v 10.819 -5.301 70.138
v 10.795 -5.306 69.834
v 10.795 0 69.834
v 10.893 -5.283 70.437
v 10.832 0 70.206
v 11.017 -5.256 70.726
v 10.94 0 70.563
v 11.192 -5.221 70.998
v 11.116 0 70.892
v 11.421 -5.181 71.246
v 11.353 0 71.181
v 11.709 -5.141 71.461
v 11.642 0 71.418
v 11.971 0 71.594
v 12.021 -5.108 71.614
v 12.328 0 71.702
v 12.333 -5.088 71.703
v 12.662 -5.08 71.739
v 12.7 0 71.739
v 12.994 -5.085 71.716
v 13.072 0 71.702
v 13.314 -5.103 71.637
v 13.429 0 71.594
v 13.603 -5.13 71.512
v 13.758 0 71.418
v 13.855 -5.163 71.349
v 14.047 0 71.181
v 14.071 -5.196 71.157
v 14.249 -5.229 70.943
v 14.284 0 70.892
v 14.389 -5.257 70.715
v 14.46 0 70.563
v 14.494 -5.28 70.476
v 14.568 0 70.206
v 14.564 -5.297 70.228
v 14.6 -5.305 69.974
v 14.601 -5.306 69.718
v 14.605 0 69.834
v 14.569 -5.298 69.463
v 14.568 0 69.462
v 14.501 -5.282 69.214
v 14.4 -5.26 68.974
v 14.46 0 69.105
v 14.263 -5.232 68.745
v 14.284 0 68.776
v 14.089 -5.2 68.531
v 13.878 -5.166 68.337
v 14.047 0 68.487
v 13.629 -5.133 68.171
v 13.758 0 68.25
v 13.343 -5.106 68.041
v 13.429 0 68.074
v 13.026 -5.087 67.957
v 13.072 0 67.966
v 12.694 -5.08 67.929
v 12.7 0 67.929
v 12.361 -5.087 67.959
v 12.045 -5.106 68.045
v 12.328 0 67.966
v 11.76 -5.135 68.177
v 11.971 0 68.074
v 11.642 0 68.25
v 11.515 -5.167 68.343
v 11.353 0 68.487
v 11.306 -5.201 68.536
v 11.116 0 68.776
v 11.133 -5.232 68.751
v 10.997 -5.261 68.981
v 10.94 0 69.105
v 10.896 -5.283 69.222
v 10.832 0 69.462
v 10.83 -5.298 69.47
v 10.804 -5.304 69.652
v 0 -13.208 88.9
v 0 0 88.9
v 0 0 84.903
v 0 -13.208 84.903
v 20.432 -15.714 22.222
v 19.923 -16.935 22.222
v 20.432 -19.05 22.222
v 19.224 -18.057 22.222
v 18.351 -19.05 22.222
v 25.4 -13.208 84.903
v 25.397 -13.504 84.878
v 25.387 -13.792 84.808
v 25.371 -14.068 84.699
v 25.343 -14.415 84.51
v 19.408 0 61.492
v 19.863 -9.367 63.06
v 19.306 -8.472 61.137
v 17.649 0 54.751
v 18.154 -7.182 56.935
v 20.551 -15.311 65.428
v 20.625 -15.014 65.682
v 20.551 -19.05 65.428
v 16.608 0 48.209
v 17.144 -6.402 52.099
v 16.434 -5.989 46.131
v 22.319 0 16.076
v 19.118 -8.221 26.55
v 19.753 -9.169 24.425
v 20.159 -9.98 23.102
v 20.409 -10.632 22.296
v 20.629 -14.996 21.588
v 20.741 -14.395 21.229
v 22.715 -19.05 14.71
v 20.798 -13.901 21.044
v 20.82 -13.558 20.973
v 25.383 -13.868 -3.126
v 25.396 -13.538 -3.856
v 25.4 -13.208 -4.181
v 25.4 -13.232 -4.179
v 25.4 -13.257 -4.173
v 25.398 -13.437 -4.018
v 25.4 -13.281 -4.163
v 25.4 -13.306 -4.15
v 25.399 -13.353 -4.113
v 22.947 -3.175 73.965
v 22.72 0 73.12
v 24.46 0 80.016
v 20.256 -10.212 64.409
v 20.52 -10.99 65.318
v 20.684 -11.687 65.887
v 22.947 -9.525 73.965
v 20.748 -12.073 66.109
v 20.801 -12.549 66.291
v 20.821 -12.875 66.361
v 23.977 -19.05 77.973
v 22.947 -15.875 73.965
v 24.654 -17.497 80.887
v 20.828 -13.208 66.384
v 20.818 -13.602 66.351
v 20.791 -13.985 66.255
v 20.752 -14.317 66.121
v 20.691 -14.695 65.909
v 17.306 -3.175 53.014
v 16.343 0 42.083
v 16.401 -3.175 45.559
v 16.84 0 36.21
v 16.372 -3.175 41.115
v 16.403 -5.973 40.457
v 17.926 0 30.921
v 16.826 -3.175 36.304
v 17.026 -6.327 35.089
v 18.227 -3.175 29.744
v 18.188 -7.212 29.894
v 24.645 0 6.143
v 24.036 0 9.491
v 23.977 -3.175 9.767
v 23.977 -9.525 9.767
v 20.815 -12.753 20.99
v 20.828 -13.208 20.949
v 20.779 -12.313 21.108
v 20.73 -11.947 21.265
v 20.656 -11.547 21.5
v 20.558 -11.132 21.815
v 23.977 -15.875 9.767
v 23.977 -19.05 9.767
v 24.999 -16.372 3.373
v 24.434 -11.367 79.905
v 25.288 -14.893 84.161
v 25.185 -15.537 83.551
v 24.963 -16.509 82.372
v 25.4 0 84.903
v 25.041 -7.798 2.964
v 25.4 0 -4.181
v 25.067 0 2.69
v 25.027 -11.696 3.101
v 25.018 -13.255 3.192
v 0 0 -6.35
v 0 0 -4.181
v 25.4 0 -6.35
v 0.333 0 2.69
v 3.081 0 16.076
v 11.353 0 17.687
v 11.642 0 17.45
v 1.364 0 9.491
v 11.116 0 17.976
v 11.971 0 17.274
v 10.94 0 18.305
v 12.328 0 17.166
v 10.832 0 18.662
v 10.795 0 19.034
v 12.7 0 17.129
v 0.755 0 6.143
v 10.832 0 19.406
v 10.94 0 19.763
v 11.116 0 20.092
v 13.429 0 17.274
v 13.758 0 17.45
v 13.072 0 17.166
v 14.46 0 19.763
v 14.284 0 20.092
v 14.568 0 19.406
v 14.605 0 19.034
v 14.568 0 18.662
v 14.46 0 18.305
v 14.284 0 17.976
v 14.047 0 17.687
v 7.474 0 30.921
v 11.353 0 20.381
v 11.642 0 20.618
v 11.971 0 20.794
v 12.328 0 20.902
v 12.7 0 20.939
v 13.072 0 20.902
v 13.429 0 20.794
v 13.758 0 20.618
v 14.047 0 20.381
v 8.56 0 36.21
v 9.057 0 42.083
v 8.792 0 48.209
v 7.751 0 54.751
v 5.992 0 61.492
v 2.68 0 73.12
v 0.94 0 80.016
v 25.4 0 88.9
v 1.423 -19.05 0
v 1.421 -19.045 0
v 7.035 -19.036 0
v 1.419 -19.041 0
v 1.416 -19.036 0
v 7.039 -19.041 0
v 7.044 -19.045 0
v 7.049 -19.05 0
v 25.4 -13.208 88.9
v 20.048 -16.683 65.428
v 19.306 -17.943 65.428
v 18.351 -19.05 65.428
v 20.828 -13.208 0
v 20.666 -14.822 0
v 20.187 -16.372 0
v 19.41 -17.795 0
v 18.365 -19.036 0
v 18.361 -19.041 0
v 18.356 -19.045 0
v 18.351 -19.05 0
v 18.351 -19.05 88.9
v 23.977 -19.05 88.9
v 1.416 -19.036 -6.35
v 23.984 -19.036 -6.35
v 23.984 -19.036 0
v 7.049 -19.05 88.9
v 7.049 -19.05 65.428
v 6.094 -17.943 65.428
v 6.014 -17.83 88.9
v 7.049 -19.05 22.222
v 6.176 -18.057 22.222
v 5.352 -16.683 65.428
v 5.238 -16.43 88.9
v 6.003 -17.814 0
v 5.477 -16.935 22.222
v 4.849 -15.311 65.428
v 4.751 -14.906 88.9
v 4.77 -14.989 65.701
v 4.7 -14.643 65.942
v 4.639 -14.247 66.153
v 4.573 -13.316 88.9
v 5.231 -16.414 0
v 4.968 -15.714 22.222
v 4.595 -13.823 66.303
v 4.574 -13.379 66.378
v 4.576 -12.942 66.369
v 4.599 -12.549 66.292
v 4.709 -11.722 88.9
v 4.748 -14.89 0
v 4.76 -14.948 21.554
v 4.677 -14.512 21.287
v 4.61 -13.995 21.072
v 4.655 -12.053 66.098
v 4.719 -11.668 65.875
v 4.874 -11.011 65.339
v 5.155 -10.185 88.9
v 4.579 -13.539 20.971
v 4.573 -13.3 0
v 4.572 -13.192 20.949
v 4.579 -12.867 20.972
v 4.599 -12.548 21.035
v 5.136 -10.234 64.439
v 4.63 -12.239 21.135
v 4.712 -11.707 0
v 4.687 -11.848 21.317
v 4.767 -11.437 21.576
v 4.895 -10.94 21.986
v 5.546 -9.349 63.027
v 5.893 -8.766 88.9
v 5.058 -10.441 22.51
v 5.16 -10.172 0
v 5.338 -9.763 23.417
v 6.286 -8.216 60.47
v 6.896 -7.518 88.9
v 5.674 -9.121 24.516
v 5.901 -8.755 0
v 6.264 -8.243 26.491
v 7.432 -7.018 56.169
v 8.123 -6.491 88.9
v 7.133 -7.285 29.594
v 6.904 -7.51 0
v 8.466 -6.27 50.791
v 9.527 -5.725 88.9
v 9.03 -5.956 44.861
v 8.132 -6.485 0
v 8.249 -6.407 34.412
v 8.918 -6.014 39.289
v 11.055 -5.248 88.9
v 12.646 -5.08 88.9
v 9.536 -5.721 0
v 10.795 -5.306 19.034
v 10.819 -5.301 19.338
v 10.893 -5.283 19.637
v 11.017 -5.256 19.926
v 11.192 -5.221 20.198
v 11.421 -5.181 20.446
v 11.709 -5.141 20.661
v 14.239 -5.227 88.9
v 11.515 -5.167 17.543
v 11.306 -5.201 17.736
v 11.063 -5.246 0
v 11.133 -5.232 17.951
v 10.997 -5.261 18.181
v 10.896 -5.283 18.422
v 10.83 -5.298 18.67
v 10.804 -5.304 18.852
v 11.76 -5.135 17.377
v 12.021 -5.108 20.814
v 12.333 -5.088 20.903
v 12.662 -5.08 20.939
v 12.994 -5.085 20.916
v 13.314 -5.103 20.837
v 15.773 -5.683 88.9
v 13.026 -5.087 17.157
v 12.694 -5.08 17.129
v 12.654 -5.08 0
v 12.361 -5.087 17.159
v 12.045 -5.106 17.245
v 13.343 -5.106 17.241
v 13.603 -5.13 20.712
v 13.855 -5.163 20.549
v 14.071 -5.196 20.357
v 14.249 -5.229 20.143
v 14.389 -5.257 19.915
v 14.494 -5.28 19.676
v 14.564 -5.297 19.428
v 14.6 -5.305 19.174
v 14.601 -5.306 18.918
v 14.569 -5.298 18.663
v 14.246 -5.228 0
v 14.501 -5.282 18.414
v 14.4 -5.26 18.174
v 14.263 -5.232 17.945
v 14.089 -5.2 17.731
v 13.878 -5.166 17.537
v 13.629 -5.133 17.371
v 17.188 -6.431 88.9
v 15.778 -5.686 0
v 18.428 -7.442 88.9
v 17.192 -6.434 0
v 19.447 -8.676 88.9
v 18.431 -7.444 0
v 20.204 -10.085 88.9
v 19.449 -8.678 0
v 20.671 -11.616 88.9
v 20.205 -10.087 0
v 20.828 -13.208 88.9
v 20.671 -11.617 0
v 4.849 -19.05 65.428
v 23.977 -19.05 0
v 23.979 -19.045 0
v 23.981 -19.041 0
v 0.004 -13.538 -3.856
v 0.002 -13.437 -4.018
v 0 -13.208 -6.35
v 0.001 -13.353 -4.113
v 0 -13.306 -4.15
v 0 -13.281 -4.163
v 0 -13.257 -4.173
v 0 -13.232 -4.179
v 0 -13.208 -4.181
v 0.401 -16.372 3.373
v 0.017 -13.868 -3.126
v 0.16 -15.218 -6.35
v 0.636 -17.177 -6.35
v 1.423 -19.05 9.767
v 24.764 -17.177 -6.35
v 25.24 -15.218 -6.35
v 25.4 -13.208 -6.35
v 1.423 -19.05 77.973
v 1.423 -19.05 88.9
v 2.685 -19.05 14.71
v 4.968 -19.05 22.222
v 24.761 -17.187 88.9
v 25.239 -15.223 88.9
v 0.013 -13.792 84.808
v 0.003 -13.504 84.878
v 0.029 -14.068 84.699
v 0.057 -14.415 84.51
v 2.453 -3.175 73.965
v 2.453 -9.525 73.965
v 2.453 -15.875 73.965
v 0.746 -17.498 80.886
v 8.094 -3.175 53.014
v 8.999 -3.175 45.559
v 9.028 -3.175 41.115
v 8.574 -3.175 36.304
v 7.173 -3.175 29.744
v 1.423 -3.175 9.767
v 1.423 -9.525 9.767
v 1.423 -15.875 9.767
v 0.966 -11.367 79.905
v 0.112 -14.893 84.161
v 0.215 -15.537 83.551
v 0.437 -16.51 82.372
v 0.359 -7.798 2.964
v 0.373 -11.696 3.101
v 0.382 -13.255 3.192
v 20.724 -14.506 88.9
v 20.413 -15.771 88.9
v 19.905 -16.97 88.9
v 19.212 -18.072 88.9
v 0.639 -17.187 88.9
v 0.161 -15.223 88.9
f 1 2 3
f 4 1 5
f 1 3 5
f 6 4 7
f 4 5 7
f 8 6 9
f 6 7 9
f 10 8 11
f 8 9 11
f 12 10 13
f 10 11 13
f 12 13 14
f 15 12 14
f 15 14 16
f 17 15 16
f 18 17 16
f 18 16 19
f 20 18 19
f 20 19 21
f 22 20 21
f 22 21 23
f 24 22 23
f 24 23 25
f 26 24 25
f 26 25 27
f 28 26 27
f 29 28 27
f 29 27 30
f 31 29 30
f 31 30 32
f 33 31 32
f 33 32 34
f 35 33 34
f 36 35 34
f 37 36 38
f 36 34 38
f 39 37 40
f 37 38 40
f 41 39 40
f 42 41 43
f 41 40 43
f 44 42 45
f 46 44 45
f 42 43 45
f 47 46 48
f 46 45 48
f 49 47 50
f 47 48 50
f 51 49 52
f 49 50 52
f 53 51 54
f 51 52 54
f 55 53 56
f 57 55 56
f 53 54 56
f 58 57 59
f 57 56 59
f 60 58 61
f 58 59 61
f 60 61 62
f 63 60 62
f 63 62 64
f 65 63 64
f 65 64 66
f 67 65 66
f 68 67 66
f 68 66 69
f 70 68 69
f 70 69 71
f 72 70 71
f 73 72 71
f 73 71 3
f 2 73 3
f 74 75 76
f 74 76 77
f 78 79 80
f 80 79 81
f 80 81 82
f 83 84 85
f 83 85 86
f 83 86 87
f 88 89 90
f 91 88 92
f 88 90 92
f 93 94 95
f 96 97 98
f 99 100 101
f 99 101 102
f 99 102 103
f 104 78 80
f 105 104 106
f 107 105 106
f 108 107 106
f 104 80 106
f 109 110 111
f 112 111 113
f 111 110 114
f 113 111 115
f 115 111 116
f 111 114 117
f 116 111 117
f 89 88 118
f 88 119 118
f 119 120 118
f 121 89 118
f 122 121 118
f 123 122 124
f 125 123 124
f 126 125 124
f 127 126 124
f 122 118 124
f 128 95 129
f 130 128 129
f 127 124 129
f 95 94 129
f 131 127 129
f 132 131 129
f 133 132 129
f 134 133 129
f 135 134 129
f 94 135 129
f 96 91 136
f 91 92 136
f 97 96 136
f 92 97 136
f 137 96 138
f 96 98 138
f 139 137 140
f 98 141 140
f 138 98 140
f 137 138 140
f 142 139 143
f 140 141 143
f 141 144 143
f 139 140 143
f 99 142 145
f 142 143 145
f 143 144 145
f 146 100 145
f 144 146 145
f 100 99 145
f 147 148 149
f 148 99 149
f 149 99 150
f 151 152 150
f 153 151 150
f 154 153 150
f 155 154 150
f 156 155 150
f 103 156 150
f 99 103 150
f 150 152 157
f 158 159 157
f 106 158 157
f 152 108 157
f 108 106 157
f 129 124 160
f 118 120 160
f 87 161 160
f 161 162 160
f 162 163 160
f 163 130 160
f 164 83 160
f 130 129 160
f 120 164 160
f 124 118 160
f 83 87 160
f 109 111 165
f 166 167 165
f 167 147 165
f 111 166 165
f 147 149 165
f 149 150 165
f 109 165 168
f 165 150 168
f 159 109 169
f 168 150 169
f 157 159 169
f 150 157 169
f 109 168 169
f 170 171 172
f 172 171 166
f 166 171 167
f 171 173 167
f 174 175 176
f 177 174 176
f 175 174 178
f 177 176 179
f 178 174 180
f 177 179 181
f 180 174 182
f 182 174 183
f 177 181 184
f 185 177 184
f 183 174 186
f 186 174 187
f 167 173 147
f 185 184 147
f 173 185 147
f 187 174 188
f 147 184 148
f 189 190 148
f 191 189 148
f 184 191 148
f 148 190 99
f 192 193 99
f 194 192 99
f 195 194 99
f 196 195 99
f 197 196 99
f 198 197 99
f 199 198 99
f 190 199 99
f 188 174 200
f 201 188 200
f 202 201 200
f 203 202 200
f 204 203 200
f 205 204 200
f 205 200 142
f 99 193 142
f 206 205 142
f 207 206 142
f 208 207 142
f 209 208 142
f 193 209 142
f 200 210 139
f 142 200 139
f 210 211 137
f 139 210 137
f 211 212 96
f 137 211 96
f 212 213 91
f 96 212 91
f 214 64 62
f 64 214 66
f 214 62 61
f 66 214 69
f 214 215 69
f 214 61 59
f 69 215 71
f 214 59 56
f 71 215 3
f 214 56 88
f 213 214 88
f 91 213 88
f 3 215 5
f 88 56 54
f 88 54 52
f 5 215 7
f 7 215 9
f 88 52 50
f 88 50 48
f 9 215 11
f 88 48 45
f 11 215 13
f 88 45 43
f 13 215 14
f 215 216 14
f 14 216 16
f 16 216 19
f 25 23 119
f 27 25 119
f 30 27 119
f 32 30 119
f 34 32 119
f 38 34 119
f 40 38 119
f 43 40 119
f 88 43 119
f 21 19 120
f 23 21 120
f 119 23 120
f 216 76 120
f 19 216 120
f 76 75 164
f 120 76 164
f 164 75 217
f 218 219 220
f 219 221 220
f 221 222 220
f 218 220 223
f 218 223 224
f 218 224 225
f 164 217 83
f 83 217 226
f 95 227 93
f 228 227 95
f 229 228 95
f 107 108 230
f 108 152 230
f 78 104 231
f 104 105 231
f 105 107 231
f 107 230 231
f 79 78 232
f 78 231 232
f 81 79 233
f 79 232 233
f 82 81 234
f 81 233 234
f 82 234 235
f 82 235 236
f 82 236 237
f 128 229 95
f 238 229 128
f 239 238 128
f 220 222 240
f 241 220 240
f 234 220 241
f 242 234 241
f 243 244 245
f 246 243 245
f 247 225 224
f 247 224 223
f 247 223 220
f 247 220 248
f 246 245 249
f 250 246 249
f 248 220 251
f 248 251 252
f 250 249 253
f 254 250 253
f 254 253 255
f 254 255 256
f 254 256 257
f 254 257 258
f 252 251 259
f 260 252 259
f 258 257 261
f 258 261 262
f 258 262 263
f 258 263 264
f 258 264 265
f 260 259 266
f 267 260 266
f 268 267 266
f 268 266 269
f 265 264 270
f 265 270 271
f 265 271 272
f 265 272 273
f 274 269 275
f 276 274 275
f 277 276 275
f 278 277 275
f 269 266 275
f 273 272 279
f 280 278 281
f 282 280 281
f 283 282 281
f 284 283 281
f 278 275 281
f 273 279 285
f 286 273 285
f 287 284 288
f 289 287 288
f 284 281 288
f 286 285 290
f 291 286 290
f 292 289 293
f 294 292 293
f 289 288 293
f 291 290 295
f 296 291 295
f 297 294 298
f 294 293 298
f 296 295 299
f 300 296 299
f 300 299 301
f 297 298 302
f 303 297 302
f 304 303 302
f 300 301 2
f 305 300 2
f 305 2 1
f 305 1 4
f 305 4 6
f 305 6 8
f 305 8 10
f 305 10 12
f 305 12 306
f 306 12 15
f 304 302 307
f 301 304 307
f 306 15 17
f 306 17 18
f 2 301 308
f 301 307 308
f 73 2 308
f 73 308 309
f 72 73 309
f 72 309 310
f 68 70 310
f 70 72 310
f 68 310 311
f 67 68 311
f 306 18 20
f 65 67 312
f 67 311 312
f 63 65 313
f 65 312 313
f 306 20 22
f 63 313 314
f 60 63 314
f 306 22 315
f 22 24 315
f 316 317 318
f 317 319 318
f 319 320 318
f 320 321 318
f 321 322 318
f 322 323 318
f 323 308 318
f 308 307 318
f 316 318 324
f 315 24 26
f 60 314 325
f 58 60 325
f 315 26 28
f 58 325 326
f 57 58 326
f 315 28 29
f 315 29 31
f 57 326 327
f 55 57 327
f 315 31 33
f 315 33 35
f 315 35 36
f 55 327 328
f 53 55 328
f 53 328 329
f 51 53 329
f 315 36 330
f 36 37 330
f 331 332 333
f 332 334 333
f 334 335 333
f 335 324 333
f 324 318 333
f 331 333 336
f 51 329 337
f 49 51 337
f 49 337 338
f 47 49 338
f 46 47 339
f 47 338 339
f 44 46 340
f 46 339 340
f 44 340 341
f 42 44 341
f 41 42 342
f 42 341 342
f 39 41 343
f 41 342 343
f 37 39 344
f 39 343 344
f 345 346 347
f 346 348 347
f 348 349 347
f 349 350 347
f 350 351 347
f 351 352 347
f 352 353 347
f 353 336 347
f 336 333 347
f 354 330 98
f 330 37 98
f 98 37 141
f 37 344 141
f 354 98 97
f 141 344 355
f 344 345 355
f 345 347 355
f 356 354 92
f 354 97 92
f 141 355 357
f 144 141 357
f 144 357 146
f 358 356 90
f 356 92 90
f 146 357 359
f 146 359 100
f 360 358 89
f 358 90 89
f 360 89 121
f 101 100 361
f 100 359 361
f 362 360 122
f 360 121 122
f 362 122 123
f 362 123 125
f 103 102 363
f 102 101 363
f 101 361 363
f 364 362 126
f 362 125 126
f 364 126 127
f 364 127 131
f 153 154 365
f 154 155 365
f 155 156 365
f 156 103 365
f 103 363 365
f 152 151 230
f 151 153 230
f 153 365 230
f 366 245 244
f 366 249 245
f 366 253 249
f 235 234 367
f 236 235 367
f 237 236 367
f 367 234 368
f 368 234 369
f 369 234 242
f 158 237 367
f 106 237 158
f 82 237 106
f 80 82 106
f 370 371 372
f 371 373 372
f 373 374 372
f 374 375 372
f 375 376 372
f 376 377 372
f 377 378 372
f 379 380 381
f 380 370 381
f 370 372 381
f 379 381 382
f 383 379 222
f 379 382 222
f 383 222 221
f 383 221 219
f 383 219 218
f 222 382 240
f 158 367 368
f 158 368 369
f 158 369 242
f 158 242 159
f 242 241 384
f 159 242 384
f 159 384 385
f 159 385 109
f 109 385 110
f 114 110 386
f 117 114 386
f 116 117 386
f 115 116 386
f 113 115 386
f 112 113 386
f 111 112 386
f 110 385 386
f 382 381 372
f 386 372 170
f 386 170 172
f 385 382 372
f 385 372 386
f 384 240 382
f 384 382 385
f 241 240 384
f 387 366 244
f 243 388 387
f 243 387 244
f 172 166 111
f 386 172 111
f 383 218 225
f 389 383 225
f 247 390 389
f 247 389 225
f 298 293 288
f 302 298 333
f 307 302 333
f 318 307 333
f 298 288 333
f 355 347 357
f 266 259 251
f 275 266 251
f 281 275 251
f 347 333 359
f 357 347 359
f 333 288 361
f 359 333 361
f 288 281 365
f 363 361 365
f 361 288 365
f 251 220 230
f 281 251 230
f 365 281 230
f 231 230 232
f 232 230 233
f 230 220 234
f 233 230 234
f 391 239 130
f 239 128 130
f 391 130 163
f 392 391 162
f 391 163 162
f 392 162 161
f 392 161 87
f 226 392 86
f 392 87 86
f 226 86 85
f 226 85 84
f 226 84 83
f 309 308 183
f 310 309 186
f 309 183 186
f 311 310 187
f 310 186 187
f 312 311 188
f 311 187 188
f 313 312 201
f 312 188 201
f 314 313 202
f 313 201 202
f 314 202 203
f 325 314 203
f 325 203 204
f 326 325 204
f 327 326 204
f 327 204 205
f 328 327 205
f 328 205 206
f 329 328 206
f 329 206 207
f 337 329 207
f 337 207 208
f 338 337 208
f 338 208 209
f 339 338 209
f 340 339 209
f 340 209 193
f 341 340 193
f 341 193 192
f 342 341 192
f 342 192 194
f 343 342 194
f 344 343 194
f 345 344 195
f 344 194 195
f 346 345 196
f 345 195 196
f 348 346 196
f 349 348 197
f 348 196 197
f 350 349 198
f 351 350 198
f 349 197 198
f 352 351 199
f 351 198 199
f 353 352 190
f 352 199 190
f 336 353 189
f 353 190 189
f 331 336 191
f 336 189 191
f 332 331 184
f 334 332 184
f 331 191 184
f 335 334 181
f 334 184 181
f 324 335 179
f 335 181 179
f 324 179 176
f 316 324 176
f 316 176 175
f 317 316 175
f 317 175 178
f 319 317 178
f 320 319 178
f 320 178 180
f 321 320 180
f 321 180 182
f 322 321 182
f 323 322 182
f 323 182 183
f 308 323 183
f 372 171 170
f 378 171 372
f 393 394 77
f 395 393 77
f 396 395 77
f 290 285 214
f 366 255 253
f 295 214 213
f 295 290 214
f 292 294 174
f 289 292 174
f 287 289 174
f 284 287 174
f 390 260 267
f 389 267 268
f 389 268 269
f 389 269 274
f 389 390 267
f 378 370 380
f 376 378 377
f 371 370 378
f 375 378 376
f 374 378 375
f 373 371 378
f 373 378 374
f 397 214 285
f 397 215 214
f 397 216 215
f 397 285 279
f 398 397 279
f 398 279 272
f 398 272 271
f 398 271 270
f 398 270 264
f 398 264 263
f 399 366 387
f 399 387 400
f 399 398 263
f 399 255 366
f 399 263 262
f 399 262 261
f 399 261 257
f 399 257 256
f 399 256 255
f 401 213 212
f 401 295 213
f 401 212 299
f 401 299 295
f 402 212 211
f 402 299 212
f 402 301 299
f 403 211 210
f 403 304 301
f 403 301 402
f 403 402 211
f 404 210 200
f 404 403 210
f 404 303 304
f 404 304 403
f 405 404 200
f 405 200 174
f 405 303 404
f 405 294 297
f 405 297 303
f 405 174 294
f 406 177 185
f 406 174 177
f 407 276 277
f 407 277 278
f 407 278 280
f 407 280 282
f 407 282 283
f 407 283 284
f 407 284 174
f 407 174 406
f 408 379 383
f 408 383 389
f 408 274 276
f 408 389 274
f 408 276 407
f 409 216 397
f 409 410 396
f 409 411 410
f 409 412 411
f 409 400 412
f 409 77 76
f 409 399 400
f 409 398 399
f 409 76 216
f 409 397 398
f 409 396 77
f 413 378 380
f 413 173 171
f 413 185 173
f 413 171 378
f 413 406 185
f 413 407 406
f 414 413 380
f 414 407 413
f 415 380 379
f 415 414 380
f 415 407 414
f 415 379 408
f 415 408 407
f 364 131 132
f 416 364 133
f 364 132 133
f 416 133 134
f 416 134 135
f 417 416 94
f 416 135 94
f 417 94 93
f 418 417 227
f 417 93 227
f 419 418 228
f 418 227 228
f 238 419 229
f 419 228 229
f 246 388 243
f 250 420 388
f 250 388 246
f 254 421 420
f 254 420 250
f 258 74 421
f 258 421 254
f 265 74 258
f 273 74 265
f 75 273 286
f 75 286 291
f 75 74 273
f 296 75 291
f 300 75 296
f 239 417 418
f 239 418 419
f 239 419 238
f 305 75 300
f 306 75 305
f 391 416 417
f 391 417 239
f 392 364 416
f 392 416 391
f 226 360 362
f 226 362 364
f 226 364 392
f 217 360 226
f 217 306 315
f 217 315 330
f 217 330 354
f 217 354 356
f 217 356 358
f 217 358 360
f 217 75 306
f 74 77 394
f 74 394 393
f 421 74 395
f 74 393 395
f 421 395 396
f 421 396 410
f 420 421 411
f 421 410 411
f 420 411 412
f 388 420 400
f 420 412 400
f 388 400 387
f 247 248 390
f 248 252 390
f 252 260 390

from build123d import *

# Parameters (mm, degrees)
F0_W      = 25.4
F0_H      = 88.9
F1_DEPTH  = 19.05
F3_DEPTH  = 88.9
F4_W      = 25.4
F4_H      = 19.0362427384
F5_DEPTH  = 6.35
F7_DEPTH  = 114.3
F8_R      = 1.905
F9_DEPTH  = 25.4
F10_W     = 32.515410101
F10_H     = 106.9501955062
F11_DEPTH = 25.4
F12_W     = 8.0266231671
F12_H     = 43.2058013976
F13_DEPTH = 25.4


with BuildPart() as f1:
    # F0 (on Front) → F1 (new body)
    with BuildSketch(Plane.XZ):
        with Locations((12.7, 44.45)):
            Rectangle(F0_W, F0_H)
    extrude(amount=F1_DEPTH)

    # F2 (on face) → F3 (cut)
    with BuildSketch(Plane(origin=(0, 0, 0), x_dir=(1, 0, 0), z_dir=(0, 0, -1))):
        with BuildLine():
            ThreePointArc((7.0488567528, 19.05), (9.5273125204, 5.7247895822), (20.828, 13.208))
            ThreePointArc((20.828, 13.208), (20.1832104178, 16.3806874796), (18.3511432472, 19.05))
            Line((18.3511432472, 19.05), (7.0488567528, 19.05))
        make_face()
    extrude(amount=-F3_DEPTH, mode=Mode.SUBTRACT)

    # F4 (on face) → F5 (join)
    with BuildSketch(Plane(origin=(0, 0, 0), x_dir=(1, 0, 0), z_dir=(0, 0, -1))):
        with Locations((12.7, 9.5181213692)):
            Rectangle(F4_W, F4_H)
    extrude(amount=F5_DEPTH)

    # F6 (on face) → F7 (cut, symmetric)
    with BuildSketch(Plane(origin=(0, 0, 0), x_dir=(1, 0, 0), z_dir=(0, 0, -1))):
        with BuildLine():
            ThreePointArc((0, 13.208), (12.7, 25.908), (25.4, 13.208))
            Line((25.4, 13.208), (31.75, 13.208))
            ThreePointArc((31.75, 13.208), (12.7, 32.258), (-6.35, 13.208))
            Line((-6.35, 13.208), (0, 13.208))
        make_face()
    extrude(amount=F7_DEPTH, both=True, mode=Mode.SUBTRACT)

    # F8 (on face) → F9 (cut)
    with BuildSketch(Plane(origin=(0, 0, 0), x_dir=(-1, 0, 0), z_dir=(0, 1, 0))):
        with Locations((-12.7, 69.8340386152)):
            Circle(F8_R)
        with Locations((-12.7, 19.0340386152)):
            Circle(F8_R)
    extrude(amount=-F9_DEPTH, mode=Mode.SUBTRACT)

    # F10 (on face) → F11 (cut)
    with BuildSketch(Plane.XZ.offset(19.05)):
        with Locations((13.0842068465, 40.5728658661)):
            Rectangle(F10_W, F10_H)
        with BuildLine():
            add(Edge.make_bspline(
                [(0, 91.1924168468), (-0.2072802179, 89.5285500339), (-0.8109265431, 84.6829979709), (5.8714529307, 61.9987966996), (8.3331655037, 53.3087405244), (10.465405729, 35.4025704859), (-0.1149214783, 10.0534714859), (-0.0357759636, -2.9865391809), (0, -8.8809849694)],
                knots=[0, 0, 0, 0, 0.1040364256, 0.3029773253, 0.4335154667, 0.6031258459, 0.8206018963, 1, 1, 1, 1], degree=3))
            Line((0, 91.1924168468), (25.4, 91.1924168468))
            add(Edge.make_bspline(
                [(25.4, 91.1924168468), (25.6072802179, 89.5285500339), (26.2109265431, 84.6829979709), (19.5285470693, 61.9987966996), (17.0668344963, 53.3087405244), (14.934594271, 35.4025704859), (25.5149214783, 10.0534714859), (25.4357759636, -2.9865391809), (25.4, -8.8809849694)],
                knots=[0, 0, 0, 0, 0.1040364256, 0.3029773253, 0.4335154667, 0.6031258459, 0.8206018963, 1, 1, 1, 1], degree=3))
            Line((25.4, -8.8809849694), (0, -8.8809849694))
        make_face(mode=Mode.SUBTRACT)
    extrude(amount=-F11_DEPTH, mode=Mode.SUBTRACT)

    # F12 (on face) → F13 (cut)
    with BuildSketch(Plane(origin=(0, 0, 0), x_dir=(0, -1, 0), z_dir=(-1, 0, 0))):
        with Locations((16.6324316524, 43.8246708363)):
            Rectangle(F12_W, F12_H)
    extrude(amount=-F13_DEPTH, mode=Mode.SUBTRACT)


solid = f1.part
